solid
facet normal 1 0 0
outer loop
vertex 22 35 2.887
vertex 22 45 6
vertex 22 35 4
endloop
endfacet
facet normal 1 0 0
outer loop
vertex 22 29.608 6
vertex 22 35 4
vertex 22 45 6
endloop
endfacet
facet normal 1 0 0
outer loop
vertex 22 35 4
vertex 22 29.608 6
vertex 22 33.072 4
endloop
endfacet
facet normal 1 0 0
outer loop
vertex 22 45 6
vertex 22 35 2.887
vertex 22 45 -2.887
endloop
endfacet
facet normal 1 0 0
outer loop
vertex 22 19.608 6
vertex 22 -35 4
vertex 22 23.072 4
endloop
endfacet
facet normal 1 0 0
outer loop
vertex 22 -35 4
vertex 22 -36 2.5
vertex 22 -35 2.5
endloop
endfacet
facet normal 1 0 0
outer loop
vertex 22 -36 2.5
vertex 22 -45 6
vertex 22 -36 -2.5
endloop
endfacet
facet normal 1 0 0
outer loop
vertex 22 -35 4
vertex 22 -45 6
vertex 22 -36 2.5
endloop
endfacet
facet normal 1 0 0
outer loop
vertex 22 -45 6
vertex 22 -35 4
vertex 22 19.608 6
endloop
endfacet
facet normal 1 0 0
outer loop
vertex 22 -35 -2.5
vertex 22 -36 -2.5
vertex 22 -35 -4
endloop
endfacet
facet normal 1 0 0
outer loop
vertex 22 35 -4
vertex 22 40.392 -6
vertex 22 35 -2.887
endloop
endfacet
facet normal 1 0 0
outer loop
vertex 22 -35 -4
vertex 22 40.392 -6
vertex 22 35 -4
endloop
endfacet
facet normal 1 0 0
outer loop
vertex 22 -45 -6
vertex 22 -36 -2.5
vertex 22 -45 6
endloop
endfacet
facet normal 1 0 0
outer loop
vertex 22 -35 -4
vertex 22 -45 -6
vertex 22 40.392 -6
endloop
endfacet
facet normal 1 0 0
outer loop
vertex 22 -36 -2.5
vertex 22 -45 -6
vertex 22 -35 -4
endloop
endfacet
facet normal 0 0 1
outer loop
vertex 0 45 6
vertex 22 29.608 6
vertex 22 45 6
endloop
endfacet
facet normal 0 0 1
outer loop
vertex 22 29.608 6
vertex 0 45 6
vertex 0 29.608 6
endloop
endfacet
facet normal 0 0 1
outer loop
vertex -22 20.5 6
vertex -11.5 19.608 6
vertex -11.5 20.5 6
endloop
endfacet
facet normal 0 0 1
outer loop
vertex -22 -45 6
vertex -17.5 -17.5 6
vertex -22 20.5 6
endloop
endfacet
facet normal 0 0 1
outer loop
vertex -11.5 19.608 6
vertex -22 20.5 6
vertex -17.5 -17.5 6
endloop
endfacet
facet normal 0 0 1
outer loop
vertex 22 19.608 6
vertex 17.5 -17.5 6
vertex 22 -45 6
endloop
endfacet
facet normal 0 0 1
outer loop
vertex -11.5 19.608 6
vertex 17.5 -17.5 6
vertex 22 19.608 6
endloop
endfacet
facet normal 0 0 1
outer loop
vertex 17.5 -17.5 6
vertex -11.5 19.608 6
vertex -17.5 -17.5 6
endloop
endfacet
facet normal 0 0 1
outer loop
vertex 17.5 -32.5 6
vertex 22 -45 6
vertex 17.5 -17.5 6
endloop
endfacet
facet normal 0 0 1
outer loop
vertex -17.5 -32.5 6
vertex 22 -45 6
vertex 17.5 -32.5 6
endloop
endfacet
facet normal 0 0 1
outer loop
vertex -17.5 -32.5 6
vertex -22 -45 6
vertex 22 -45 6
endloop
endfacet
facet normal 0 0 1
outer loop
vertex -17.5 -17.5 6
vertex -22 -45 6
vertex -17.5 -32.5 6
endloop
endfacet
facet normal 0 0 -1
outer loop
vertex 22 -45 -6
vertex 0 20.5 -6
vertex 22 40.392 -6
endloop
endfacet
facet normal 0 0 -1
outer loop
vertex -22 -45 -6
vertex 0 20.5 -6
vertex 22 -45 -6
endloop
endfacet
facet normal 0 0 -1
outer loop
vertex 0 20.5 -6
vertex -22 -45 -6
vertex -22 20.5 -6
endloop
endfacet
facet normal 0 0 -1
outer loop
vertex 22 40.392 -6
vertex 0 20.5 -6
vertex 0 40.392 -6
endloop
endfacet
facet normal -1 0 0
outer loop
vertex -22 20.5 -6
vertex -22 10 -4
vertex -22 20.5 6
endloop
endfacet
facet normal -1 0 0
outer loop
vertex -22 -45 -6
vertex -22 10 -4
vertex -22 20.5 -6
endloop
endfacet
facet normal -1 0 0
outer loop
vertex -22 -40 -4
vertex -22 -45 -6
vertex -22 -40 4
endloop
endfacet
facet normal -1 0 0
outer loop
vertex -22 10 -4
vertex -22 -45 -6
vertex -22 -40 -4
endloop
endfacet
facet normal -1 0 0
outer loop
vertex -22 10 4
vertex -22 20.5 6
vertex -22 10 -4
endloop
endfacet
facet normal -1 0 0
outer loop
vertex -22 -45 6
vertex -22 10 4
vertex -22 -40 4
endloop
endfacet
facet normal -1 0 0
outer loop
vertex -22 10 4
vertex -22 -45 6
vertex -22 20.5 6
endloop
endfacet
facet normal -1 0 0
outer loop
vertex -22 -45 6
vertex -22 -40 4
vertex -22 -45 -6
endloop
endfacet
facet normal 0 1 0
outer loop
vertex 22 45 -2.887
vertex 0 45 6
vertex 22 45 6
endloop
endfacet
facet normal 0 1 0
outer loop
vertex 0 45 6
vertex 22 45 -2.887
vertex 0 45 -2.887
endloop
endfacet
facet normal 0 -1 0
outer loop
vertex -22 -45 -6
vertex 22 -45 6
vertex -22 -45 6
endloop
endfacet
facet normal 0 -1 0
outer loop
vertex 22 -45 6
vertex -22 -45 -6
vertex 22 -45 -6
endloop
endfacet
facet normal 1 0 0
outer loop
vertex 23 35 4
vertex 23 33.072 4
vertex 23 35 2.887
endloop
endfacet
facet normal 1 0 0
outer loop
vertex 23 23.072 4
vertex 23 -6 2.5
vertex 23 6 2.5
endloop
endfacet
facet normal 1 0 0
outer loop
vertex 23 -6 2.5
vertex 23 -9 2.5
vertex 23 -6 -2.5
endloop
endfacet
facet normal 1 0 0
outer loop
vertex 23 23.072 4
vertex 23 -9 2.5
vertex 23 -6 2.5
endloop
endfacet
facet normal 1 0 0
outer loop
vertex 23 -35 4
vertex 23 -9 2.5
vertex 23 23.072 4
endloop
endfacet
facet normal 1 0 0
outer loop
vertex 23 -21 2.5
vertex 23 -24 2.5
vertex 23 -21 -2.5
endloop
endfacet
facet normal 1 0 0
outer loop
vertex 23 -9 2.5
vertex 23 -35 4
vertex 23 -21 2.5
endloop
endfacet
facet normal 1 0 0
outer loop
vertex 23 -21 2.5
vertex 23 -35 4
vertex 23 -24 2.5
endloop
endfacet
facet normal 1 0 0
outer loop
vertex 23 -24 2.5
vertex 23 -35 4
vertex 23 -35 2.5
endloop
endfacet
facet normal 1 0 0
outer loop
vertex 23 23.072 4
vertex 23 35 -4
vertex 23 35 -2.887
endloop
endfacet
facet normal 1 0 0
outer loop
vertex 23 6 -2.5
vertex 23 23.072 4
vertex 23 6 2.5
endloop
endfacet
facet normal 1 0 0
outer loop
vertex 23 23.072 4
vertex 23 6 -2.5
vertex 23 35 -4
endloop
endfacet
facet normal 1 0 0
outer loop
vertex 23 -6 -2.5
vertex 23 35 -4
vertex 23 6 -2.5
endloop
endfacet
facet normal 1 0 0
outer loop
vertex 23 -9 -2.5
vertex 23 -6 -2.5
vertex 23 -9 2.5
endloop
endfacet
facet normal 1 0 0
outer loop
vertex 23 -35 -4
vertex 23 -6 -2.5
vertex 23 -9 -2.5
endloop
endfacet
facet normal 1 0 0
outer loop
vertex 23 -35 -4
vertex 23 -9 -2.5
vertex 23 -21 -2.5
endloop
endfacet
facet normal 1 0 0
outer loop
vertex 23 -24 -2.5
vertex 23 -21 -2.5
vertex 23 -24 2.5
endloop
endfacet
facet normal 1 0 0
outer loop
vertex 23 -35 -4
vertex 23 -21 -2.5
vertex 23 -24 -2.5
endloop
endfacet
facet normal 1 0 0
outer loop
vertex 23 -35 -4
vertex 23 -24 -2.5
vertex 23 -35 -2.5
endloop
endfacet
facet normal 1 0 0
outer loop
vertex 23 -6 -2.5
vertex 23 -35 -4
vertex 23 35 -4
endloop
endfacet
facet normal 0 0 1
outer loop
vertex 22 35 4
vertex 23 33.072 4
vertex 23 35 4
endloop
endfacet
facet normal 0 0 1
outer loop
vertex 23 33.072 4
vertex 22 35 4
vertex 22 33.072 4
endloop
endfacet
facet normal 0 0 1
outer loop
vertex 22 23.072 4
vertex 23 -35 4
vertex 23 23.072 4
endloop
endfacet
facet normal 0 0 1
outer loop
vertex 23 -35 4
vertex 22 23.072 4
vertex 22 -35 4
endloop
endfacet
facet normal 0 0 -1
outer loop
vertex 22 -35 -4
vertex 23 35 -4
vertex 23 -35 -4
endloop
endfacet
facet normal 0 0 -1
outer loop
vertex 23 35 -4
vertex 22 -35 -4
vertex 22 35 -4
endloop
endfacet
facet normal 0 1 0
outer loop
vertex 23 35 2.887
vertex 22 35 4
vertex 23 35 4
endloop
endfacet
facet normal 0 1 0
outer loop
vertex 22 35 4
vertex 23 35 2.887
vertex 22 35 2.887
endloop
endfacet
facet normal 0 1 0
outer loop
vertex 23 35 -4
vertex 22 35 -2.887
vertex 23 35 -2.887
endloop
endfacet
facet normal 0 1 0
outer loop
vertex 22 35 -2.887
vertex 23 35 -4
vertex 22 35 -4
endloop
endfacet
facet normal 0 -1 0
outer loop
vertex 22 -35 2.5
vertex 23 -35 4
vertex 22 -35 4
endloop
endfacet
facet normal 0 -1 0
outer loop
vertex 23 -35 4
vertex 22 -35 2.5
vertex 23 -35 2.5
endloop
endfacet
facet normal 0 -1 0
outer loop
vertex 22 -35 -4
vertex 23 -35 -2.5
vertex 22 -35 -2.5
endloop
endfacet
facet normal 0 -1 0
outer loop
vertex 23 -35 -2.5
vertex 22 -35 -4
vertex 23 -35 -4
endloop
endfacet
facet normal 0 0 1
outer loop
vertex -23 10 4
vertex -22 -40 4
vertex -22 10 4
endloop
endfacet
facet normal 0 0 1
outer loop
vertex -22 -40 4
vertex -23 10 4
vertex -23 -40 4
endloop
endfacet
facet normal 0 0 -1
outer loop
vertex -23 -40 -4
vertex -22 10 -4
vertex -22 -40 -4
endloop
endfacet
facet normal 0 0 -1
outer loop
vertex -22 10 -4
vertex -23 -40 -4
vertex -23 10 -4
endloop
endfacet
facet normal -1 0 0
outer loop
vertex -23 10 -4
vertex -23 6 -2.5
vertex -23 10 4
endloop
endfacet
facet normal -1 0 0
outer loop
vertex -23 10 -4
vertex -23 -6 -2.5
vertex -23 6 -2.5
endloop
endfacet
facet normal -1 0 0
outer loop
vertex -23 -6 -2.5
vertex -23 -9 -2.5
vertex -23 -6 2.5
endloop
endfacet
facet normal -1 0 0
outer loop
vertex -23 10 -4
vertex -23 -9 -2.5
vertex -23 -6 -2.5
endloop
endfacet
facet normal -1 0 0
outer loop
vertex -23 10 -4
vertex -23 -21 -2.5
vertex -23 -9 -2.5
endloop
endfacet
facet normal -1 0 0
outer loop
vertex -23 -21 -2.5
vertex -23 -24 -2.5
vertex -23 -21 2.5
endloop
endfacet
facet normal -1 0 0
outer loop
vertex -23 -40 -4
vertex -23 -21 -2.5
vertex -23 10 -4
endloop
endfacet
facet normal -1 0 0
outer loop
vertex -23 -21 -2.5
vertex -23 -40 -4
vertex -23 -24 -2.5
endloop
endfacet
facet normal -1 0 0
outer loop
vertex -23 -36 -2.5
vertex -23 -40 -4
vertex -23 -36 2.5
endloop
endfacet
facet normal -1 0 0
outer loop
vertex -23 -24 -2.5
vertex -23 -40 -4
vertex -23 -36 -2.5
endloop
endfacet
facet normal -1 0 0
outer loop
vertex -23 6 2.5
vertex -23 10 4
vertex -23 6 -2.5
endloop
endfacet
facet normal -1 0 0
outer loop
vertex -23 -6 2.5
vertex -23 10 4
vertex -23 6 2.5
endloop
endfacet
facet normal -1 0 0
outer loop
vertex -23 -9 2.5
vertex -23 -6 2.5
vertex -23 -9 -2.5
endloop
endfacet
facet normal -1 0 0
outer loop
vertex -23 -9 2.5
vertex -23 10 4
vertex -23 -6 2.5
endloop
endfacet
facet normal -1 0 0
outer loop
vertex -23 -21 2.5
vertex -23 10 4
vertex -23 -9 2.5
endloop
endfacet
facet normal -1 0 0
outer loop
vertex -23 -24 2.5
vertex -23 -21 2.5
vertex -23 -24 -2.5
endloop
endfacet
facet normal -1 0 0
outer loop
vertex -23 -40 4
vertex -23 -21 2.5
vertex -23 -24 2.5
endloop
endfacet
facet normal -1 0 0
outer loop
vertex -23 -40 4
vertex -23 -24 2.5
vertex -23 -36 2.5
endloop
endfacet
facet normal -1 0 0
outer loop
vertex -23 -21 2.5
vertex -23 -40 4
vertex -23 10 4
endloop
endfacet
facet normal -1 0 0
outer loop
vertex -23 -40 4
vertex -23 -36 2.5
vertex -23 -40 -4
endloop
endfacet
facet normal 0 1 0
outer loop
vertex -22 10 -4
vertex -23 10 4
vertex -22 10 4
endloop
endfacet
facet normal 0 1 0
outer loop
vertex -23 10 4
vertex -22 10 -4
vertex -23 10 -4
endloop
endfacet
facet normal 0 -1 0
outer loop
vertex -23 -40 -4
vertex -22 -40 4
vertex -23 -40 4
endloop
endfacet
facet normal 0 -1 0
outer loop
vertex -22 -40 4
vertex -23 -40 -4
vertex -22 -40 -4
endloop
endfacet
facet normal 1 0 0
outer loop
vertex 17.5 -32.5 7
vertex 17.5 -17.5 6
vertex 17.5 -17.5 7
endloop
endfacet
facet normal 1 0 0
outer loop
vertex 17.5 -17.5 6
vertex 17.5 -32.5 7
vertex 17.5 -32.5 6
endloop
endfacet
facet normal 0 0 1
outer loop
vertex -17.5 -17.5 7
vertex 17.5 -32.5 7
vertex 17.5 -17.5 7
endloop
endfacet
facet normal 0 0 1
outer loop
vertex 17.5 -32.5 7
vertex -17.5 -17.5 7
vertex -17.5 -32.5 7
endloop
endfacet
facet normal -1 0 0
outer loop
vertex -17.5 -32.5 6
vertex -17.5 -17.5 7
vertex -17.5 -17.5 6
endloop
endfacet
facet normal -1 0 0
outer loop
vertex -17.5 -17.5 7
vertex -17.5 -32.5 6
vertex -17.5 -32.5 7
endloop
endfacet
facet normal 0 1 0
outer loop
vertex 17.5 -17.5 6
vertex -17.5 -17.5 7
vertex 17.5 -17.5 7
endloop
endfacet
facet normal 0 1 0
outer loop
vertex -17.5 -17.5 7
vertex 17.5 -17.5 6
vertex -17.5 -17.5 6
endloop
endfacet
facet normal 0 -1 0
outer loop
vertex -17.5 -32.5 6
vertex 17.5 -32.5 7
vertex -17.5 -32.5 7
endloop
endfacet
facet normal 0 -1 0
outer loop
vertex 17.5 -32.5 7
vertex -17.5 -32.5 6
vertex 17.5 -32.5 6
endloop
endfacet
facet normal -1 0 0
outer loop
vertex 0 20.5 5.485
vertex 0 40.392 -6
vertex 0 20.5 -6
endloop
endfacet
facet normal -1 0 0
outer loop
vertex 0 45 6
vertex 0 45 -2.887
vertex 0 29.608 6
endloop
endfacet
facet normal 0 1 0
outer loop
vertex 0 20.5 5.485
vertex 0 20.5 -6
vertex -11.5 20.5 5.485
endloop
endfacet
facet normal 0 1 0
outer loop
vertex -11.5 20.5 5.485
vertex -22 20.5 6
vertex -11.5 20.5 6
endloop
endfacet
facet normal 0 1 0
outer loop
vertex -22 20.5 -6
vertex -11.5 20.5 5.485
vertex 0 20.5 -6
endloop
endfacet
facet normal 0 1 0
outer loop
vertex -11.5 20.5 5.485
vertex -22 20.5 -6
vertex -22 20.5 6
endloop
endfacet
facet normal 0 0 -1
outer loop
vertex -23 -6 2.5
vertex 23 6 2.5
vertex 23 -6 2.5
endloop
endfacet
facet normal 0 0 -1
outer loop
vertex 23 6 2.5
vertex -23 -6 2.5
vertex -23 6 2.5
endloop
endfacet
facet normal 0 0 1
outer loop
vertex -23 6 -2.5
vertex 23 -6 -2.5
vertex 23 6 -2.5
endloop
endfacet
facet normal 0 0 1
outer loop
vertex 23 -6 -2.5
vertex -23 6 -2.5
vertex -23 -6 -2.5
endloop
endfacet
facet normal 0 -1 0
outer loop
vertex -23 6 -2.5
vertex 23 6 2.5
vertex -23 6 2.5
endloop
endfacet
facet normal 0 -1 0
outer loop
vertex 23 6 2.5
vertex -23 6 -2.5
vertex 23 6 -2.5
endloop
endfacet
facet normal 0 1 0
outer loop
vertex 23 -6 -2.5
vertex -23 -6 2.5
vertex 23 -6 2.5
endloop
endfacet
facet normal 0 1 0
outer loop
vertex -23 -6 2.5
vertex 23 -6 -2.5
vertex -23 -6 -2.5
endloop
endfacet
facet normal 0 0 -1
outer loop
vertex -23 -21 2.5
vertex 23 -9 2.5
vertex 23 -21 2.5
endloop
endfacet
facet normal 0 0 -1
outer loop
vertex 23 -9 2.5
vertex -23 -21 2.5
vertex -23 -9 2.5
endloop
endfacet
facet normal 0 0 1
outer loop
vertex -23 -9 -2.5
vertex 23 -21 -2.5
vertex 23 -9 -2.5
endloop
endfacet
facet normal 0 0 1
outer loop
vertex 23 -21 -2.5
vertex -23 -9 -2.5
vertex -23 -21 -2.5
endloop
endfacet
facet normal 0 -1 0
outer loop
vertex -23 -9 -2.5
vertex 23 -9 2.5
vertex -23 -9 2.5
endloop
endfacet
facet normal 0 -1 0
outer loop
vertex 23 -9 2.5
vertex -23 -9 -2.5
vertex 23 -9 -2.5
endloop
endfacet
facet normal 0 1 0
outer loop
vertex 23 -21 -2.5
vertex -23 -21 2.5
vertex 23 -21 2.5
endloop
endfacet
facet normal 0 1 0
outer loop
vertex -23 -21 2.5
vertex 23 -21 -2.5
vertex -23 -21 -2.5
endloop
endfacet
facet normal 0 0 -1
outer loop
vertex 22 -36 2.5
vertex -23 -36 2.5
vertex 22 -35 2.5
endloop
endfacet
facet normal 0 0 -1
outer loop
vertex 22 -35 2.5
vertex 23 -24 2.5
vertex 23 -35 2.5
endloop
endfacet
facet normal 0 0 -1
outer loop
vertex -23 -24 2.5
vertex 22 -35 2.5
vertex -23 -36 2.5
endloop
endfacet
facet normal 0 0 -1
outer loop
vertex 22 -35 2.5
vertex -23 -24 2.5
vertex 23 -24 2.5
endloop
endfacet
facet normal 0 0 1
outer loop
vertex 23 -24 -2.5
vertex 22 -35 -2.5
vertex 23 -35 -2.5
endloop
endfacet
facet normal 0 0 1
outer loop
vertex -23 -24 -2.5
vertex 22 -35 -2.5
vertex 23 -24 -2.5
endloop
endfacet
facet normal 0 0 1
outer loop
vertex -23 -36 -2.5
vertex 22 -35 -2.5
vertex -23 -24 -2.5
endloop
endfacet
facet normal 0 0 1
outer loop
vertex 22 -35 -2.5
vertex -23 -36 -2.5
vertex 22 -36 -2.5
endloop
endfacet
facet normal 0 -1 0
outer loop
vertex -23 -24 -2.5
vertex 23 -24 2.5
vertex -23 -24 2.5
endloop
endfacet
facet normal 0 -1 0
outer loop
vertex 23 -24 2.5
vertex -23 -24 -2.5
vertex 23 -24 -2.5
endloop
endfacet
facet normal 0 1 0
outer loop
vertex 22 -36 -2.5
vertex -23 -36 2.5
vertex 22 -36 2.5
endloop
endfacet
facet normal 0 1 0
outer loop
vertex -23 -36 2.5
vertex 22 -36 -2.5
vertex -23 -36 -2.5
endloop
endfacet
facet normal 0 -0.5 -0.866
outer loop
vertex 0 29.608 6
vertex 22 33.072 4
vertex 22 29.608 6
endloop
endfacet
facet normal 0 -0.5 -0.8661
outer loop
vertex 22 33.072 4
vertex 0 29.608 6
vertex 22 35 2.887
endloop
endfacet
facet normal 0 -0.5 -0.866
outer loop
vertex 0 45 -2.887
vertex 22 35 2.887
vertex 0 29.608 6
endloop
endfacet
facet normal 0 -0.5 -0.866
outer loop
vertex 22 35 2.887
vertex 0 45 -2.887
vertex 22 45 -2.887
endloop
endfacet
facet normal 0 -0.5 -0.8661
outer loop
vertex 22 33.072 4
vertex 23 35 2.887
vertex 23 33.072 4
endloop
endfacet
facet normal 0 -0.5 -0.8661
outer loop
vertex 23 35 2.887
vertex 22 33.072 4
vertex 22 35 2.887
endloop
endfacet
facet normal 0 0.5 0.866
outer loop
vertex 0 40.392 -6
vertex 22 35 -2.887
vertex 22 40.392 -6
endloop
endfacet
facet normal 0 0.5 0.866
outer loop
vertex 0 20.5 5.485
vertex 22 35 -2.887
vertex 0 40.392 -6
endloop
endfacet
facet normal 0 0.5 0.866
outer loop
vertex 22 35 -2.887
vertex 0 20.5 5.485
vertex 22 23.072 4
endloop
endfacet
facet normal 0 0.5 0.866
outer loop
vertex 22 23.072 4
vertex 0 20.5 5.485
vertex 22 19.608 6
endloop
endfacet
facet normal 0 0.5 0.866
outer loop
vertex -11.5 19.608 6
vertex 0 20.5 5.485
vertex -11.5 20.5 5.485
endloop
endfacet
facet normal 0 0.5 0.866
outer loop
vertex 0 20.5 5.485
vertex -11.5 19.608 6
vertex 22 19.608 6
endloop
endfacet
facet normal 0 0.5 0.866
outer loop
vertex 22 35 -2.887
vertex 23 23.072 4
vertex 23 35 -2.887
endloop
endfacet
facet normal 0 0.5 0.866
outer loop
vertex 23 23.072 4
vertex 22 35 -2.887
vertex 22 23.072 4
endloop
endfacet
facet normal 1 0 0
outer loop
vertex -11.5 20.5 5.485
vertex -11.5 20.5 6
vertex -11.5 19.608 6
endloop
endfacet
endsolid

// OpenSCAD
//!OpenSCAD

module example003()
{
	difference() {
		union() {
			cube([44, 90, 12], center = true);
            translate([22,0,0]){
                cube([2, 70, 8], center = true);
            }
            translate([-22,-15,0]){
                cube([2, 50, 8], center = true);
            }
            translate([0,-25,6]){
			    cube([35, 15, 2], center = true);   
            }
		}
        translate([-11.5,33,0]){
	        cube([23, 25, 12], center = true);
        }
        translate([0,0,0]){
		    cube([46, 12, 5], center = true);
	    }
        translate([0,-15,0]){
            cube([46, 12, 5], center = true);
	    }
        translate([0,-30,0]){
            cube([46, 12, 5], center = true);
        }
        translate([11.5,35,0]){
            rotate([-30,0,0]){
                cube([46, 40, 5], center = true);
            }
        }
	}
}

example003();
